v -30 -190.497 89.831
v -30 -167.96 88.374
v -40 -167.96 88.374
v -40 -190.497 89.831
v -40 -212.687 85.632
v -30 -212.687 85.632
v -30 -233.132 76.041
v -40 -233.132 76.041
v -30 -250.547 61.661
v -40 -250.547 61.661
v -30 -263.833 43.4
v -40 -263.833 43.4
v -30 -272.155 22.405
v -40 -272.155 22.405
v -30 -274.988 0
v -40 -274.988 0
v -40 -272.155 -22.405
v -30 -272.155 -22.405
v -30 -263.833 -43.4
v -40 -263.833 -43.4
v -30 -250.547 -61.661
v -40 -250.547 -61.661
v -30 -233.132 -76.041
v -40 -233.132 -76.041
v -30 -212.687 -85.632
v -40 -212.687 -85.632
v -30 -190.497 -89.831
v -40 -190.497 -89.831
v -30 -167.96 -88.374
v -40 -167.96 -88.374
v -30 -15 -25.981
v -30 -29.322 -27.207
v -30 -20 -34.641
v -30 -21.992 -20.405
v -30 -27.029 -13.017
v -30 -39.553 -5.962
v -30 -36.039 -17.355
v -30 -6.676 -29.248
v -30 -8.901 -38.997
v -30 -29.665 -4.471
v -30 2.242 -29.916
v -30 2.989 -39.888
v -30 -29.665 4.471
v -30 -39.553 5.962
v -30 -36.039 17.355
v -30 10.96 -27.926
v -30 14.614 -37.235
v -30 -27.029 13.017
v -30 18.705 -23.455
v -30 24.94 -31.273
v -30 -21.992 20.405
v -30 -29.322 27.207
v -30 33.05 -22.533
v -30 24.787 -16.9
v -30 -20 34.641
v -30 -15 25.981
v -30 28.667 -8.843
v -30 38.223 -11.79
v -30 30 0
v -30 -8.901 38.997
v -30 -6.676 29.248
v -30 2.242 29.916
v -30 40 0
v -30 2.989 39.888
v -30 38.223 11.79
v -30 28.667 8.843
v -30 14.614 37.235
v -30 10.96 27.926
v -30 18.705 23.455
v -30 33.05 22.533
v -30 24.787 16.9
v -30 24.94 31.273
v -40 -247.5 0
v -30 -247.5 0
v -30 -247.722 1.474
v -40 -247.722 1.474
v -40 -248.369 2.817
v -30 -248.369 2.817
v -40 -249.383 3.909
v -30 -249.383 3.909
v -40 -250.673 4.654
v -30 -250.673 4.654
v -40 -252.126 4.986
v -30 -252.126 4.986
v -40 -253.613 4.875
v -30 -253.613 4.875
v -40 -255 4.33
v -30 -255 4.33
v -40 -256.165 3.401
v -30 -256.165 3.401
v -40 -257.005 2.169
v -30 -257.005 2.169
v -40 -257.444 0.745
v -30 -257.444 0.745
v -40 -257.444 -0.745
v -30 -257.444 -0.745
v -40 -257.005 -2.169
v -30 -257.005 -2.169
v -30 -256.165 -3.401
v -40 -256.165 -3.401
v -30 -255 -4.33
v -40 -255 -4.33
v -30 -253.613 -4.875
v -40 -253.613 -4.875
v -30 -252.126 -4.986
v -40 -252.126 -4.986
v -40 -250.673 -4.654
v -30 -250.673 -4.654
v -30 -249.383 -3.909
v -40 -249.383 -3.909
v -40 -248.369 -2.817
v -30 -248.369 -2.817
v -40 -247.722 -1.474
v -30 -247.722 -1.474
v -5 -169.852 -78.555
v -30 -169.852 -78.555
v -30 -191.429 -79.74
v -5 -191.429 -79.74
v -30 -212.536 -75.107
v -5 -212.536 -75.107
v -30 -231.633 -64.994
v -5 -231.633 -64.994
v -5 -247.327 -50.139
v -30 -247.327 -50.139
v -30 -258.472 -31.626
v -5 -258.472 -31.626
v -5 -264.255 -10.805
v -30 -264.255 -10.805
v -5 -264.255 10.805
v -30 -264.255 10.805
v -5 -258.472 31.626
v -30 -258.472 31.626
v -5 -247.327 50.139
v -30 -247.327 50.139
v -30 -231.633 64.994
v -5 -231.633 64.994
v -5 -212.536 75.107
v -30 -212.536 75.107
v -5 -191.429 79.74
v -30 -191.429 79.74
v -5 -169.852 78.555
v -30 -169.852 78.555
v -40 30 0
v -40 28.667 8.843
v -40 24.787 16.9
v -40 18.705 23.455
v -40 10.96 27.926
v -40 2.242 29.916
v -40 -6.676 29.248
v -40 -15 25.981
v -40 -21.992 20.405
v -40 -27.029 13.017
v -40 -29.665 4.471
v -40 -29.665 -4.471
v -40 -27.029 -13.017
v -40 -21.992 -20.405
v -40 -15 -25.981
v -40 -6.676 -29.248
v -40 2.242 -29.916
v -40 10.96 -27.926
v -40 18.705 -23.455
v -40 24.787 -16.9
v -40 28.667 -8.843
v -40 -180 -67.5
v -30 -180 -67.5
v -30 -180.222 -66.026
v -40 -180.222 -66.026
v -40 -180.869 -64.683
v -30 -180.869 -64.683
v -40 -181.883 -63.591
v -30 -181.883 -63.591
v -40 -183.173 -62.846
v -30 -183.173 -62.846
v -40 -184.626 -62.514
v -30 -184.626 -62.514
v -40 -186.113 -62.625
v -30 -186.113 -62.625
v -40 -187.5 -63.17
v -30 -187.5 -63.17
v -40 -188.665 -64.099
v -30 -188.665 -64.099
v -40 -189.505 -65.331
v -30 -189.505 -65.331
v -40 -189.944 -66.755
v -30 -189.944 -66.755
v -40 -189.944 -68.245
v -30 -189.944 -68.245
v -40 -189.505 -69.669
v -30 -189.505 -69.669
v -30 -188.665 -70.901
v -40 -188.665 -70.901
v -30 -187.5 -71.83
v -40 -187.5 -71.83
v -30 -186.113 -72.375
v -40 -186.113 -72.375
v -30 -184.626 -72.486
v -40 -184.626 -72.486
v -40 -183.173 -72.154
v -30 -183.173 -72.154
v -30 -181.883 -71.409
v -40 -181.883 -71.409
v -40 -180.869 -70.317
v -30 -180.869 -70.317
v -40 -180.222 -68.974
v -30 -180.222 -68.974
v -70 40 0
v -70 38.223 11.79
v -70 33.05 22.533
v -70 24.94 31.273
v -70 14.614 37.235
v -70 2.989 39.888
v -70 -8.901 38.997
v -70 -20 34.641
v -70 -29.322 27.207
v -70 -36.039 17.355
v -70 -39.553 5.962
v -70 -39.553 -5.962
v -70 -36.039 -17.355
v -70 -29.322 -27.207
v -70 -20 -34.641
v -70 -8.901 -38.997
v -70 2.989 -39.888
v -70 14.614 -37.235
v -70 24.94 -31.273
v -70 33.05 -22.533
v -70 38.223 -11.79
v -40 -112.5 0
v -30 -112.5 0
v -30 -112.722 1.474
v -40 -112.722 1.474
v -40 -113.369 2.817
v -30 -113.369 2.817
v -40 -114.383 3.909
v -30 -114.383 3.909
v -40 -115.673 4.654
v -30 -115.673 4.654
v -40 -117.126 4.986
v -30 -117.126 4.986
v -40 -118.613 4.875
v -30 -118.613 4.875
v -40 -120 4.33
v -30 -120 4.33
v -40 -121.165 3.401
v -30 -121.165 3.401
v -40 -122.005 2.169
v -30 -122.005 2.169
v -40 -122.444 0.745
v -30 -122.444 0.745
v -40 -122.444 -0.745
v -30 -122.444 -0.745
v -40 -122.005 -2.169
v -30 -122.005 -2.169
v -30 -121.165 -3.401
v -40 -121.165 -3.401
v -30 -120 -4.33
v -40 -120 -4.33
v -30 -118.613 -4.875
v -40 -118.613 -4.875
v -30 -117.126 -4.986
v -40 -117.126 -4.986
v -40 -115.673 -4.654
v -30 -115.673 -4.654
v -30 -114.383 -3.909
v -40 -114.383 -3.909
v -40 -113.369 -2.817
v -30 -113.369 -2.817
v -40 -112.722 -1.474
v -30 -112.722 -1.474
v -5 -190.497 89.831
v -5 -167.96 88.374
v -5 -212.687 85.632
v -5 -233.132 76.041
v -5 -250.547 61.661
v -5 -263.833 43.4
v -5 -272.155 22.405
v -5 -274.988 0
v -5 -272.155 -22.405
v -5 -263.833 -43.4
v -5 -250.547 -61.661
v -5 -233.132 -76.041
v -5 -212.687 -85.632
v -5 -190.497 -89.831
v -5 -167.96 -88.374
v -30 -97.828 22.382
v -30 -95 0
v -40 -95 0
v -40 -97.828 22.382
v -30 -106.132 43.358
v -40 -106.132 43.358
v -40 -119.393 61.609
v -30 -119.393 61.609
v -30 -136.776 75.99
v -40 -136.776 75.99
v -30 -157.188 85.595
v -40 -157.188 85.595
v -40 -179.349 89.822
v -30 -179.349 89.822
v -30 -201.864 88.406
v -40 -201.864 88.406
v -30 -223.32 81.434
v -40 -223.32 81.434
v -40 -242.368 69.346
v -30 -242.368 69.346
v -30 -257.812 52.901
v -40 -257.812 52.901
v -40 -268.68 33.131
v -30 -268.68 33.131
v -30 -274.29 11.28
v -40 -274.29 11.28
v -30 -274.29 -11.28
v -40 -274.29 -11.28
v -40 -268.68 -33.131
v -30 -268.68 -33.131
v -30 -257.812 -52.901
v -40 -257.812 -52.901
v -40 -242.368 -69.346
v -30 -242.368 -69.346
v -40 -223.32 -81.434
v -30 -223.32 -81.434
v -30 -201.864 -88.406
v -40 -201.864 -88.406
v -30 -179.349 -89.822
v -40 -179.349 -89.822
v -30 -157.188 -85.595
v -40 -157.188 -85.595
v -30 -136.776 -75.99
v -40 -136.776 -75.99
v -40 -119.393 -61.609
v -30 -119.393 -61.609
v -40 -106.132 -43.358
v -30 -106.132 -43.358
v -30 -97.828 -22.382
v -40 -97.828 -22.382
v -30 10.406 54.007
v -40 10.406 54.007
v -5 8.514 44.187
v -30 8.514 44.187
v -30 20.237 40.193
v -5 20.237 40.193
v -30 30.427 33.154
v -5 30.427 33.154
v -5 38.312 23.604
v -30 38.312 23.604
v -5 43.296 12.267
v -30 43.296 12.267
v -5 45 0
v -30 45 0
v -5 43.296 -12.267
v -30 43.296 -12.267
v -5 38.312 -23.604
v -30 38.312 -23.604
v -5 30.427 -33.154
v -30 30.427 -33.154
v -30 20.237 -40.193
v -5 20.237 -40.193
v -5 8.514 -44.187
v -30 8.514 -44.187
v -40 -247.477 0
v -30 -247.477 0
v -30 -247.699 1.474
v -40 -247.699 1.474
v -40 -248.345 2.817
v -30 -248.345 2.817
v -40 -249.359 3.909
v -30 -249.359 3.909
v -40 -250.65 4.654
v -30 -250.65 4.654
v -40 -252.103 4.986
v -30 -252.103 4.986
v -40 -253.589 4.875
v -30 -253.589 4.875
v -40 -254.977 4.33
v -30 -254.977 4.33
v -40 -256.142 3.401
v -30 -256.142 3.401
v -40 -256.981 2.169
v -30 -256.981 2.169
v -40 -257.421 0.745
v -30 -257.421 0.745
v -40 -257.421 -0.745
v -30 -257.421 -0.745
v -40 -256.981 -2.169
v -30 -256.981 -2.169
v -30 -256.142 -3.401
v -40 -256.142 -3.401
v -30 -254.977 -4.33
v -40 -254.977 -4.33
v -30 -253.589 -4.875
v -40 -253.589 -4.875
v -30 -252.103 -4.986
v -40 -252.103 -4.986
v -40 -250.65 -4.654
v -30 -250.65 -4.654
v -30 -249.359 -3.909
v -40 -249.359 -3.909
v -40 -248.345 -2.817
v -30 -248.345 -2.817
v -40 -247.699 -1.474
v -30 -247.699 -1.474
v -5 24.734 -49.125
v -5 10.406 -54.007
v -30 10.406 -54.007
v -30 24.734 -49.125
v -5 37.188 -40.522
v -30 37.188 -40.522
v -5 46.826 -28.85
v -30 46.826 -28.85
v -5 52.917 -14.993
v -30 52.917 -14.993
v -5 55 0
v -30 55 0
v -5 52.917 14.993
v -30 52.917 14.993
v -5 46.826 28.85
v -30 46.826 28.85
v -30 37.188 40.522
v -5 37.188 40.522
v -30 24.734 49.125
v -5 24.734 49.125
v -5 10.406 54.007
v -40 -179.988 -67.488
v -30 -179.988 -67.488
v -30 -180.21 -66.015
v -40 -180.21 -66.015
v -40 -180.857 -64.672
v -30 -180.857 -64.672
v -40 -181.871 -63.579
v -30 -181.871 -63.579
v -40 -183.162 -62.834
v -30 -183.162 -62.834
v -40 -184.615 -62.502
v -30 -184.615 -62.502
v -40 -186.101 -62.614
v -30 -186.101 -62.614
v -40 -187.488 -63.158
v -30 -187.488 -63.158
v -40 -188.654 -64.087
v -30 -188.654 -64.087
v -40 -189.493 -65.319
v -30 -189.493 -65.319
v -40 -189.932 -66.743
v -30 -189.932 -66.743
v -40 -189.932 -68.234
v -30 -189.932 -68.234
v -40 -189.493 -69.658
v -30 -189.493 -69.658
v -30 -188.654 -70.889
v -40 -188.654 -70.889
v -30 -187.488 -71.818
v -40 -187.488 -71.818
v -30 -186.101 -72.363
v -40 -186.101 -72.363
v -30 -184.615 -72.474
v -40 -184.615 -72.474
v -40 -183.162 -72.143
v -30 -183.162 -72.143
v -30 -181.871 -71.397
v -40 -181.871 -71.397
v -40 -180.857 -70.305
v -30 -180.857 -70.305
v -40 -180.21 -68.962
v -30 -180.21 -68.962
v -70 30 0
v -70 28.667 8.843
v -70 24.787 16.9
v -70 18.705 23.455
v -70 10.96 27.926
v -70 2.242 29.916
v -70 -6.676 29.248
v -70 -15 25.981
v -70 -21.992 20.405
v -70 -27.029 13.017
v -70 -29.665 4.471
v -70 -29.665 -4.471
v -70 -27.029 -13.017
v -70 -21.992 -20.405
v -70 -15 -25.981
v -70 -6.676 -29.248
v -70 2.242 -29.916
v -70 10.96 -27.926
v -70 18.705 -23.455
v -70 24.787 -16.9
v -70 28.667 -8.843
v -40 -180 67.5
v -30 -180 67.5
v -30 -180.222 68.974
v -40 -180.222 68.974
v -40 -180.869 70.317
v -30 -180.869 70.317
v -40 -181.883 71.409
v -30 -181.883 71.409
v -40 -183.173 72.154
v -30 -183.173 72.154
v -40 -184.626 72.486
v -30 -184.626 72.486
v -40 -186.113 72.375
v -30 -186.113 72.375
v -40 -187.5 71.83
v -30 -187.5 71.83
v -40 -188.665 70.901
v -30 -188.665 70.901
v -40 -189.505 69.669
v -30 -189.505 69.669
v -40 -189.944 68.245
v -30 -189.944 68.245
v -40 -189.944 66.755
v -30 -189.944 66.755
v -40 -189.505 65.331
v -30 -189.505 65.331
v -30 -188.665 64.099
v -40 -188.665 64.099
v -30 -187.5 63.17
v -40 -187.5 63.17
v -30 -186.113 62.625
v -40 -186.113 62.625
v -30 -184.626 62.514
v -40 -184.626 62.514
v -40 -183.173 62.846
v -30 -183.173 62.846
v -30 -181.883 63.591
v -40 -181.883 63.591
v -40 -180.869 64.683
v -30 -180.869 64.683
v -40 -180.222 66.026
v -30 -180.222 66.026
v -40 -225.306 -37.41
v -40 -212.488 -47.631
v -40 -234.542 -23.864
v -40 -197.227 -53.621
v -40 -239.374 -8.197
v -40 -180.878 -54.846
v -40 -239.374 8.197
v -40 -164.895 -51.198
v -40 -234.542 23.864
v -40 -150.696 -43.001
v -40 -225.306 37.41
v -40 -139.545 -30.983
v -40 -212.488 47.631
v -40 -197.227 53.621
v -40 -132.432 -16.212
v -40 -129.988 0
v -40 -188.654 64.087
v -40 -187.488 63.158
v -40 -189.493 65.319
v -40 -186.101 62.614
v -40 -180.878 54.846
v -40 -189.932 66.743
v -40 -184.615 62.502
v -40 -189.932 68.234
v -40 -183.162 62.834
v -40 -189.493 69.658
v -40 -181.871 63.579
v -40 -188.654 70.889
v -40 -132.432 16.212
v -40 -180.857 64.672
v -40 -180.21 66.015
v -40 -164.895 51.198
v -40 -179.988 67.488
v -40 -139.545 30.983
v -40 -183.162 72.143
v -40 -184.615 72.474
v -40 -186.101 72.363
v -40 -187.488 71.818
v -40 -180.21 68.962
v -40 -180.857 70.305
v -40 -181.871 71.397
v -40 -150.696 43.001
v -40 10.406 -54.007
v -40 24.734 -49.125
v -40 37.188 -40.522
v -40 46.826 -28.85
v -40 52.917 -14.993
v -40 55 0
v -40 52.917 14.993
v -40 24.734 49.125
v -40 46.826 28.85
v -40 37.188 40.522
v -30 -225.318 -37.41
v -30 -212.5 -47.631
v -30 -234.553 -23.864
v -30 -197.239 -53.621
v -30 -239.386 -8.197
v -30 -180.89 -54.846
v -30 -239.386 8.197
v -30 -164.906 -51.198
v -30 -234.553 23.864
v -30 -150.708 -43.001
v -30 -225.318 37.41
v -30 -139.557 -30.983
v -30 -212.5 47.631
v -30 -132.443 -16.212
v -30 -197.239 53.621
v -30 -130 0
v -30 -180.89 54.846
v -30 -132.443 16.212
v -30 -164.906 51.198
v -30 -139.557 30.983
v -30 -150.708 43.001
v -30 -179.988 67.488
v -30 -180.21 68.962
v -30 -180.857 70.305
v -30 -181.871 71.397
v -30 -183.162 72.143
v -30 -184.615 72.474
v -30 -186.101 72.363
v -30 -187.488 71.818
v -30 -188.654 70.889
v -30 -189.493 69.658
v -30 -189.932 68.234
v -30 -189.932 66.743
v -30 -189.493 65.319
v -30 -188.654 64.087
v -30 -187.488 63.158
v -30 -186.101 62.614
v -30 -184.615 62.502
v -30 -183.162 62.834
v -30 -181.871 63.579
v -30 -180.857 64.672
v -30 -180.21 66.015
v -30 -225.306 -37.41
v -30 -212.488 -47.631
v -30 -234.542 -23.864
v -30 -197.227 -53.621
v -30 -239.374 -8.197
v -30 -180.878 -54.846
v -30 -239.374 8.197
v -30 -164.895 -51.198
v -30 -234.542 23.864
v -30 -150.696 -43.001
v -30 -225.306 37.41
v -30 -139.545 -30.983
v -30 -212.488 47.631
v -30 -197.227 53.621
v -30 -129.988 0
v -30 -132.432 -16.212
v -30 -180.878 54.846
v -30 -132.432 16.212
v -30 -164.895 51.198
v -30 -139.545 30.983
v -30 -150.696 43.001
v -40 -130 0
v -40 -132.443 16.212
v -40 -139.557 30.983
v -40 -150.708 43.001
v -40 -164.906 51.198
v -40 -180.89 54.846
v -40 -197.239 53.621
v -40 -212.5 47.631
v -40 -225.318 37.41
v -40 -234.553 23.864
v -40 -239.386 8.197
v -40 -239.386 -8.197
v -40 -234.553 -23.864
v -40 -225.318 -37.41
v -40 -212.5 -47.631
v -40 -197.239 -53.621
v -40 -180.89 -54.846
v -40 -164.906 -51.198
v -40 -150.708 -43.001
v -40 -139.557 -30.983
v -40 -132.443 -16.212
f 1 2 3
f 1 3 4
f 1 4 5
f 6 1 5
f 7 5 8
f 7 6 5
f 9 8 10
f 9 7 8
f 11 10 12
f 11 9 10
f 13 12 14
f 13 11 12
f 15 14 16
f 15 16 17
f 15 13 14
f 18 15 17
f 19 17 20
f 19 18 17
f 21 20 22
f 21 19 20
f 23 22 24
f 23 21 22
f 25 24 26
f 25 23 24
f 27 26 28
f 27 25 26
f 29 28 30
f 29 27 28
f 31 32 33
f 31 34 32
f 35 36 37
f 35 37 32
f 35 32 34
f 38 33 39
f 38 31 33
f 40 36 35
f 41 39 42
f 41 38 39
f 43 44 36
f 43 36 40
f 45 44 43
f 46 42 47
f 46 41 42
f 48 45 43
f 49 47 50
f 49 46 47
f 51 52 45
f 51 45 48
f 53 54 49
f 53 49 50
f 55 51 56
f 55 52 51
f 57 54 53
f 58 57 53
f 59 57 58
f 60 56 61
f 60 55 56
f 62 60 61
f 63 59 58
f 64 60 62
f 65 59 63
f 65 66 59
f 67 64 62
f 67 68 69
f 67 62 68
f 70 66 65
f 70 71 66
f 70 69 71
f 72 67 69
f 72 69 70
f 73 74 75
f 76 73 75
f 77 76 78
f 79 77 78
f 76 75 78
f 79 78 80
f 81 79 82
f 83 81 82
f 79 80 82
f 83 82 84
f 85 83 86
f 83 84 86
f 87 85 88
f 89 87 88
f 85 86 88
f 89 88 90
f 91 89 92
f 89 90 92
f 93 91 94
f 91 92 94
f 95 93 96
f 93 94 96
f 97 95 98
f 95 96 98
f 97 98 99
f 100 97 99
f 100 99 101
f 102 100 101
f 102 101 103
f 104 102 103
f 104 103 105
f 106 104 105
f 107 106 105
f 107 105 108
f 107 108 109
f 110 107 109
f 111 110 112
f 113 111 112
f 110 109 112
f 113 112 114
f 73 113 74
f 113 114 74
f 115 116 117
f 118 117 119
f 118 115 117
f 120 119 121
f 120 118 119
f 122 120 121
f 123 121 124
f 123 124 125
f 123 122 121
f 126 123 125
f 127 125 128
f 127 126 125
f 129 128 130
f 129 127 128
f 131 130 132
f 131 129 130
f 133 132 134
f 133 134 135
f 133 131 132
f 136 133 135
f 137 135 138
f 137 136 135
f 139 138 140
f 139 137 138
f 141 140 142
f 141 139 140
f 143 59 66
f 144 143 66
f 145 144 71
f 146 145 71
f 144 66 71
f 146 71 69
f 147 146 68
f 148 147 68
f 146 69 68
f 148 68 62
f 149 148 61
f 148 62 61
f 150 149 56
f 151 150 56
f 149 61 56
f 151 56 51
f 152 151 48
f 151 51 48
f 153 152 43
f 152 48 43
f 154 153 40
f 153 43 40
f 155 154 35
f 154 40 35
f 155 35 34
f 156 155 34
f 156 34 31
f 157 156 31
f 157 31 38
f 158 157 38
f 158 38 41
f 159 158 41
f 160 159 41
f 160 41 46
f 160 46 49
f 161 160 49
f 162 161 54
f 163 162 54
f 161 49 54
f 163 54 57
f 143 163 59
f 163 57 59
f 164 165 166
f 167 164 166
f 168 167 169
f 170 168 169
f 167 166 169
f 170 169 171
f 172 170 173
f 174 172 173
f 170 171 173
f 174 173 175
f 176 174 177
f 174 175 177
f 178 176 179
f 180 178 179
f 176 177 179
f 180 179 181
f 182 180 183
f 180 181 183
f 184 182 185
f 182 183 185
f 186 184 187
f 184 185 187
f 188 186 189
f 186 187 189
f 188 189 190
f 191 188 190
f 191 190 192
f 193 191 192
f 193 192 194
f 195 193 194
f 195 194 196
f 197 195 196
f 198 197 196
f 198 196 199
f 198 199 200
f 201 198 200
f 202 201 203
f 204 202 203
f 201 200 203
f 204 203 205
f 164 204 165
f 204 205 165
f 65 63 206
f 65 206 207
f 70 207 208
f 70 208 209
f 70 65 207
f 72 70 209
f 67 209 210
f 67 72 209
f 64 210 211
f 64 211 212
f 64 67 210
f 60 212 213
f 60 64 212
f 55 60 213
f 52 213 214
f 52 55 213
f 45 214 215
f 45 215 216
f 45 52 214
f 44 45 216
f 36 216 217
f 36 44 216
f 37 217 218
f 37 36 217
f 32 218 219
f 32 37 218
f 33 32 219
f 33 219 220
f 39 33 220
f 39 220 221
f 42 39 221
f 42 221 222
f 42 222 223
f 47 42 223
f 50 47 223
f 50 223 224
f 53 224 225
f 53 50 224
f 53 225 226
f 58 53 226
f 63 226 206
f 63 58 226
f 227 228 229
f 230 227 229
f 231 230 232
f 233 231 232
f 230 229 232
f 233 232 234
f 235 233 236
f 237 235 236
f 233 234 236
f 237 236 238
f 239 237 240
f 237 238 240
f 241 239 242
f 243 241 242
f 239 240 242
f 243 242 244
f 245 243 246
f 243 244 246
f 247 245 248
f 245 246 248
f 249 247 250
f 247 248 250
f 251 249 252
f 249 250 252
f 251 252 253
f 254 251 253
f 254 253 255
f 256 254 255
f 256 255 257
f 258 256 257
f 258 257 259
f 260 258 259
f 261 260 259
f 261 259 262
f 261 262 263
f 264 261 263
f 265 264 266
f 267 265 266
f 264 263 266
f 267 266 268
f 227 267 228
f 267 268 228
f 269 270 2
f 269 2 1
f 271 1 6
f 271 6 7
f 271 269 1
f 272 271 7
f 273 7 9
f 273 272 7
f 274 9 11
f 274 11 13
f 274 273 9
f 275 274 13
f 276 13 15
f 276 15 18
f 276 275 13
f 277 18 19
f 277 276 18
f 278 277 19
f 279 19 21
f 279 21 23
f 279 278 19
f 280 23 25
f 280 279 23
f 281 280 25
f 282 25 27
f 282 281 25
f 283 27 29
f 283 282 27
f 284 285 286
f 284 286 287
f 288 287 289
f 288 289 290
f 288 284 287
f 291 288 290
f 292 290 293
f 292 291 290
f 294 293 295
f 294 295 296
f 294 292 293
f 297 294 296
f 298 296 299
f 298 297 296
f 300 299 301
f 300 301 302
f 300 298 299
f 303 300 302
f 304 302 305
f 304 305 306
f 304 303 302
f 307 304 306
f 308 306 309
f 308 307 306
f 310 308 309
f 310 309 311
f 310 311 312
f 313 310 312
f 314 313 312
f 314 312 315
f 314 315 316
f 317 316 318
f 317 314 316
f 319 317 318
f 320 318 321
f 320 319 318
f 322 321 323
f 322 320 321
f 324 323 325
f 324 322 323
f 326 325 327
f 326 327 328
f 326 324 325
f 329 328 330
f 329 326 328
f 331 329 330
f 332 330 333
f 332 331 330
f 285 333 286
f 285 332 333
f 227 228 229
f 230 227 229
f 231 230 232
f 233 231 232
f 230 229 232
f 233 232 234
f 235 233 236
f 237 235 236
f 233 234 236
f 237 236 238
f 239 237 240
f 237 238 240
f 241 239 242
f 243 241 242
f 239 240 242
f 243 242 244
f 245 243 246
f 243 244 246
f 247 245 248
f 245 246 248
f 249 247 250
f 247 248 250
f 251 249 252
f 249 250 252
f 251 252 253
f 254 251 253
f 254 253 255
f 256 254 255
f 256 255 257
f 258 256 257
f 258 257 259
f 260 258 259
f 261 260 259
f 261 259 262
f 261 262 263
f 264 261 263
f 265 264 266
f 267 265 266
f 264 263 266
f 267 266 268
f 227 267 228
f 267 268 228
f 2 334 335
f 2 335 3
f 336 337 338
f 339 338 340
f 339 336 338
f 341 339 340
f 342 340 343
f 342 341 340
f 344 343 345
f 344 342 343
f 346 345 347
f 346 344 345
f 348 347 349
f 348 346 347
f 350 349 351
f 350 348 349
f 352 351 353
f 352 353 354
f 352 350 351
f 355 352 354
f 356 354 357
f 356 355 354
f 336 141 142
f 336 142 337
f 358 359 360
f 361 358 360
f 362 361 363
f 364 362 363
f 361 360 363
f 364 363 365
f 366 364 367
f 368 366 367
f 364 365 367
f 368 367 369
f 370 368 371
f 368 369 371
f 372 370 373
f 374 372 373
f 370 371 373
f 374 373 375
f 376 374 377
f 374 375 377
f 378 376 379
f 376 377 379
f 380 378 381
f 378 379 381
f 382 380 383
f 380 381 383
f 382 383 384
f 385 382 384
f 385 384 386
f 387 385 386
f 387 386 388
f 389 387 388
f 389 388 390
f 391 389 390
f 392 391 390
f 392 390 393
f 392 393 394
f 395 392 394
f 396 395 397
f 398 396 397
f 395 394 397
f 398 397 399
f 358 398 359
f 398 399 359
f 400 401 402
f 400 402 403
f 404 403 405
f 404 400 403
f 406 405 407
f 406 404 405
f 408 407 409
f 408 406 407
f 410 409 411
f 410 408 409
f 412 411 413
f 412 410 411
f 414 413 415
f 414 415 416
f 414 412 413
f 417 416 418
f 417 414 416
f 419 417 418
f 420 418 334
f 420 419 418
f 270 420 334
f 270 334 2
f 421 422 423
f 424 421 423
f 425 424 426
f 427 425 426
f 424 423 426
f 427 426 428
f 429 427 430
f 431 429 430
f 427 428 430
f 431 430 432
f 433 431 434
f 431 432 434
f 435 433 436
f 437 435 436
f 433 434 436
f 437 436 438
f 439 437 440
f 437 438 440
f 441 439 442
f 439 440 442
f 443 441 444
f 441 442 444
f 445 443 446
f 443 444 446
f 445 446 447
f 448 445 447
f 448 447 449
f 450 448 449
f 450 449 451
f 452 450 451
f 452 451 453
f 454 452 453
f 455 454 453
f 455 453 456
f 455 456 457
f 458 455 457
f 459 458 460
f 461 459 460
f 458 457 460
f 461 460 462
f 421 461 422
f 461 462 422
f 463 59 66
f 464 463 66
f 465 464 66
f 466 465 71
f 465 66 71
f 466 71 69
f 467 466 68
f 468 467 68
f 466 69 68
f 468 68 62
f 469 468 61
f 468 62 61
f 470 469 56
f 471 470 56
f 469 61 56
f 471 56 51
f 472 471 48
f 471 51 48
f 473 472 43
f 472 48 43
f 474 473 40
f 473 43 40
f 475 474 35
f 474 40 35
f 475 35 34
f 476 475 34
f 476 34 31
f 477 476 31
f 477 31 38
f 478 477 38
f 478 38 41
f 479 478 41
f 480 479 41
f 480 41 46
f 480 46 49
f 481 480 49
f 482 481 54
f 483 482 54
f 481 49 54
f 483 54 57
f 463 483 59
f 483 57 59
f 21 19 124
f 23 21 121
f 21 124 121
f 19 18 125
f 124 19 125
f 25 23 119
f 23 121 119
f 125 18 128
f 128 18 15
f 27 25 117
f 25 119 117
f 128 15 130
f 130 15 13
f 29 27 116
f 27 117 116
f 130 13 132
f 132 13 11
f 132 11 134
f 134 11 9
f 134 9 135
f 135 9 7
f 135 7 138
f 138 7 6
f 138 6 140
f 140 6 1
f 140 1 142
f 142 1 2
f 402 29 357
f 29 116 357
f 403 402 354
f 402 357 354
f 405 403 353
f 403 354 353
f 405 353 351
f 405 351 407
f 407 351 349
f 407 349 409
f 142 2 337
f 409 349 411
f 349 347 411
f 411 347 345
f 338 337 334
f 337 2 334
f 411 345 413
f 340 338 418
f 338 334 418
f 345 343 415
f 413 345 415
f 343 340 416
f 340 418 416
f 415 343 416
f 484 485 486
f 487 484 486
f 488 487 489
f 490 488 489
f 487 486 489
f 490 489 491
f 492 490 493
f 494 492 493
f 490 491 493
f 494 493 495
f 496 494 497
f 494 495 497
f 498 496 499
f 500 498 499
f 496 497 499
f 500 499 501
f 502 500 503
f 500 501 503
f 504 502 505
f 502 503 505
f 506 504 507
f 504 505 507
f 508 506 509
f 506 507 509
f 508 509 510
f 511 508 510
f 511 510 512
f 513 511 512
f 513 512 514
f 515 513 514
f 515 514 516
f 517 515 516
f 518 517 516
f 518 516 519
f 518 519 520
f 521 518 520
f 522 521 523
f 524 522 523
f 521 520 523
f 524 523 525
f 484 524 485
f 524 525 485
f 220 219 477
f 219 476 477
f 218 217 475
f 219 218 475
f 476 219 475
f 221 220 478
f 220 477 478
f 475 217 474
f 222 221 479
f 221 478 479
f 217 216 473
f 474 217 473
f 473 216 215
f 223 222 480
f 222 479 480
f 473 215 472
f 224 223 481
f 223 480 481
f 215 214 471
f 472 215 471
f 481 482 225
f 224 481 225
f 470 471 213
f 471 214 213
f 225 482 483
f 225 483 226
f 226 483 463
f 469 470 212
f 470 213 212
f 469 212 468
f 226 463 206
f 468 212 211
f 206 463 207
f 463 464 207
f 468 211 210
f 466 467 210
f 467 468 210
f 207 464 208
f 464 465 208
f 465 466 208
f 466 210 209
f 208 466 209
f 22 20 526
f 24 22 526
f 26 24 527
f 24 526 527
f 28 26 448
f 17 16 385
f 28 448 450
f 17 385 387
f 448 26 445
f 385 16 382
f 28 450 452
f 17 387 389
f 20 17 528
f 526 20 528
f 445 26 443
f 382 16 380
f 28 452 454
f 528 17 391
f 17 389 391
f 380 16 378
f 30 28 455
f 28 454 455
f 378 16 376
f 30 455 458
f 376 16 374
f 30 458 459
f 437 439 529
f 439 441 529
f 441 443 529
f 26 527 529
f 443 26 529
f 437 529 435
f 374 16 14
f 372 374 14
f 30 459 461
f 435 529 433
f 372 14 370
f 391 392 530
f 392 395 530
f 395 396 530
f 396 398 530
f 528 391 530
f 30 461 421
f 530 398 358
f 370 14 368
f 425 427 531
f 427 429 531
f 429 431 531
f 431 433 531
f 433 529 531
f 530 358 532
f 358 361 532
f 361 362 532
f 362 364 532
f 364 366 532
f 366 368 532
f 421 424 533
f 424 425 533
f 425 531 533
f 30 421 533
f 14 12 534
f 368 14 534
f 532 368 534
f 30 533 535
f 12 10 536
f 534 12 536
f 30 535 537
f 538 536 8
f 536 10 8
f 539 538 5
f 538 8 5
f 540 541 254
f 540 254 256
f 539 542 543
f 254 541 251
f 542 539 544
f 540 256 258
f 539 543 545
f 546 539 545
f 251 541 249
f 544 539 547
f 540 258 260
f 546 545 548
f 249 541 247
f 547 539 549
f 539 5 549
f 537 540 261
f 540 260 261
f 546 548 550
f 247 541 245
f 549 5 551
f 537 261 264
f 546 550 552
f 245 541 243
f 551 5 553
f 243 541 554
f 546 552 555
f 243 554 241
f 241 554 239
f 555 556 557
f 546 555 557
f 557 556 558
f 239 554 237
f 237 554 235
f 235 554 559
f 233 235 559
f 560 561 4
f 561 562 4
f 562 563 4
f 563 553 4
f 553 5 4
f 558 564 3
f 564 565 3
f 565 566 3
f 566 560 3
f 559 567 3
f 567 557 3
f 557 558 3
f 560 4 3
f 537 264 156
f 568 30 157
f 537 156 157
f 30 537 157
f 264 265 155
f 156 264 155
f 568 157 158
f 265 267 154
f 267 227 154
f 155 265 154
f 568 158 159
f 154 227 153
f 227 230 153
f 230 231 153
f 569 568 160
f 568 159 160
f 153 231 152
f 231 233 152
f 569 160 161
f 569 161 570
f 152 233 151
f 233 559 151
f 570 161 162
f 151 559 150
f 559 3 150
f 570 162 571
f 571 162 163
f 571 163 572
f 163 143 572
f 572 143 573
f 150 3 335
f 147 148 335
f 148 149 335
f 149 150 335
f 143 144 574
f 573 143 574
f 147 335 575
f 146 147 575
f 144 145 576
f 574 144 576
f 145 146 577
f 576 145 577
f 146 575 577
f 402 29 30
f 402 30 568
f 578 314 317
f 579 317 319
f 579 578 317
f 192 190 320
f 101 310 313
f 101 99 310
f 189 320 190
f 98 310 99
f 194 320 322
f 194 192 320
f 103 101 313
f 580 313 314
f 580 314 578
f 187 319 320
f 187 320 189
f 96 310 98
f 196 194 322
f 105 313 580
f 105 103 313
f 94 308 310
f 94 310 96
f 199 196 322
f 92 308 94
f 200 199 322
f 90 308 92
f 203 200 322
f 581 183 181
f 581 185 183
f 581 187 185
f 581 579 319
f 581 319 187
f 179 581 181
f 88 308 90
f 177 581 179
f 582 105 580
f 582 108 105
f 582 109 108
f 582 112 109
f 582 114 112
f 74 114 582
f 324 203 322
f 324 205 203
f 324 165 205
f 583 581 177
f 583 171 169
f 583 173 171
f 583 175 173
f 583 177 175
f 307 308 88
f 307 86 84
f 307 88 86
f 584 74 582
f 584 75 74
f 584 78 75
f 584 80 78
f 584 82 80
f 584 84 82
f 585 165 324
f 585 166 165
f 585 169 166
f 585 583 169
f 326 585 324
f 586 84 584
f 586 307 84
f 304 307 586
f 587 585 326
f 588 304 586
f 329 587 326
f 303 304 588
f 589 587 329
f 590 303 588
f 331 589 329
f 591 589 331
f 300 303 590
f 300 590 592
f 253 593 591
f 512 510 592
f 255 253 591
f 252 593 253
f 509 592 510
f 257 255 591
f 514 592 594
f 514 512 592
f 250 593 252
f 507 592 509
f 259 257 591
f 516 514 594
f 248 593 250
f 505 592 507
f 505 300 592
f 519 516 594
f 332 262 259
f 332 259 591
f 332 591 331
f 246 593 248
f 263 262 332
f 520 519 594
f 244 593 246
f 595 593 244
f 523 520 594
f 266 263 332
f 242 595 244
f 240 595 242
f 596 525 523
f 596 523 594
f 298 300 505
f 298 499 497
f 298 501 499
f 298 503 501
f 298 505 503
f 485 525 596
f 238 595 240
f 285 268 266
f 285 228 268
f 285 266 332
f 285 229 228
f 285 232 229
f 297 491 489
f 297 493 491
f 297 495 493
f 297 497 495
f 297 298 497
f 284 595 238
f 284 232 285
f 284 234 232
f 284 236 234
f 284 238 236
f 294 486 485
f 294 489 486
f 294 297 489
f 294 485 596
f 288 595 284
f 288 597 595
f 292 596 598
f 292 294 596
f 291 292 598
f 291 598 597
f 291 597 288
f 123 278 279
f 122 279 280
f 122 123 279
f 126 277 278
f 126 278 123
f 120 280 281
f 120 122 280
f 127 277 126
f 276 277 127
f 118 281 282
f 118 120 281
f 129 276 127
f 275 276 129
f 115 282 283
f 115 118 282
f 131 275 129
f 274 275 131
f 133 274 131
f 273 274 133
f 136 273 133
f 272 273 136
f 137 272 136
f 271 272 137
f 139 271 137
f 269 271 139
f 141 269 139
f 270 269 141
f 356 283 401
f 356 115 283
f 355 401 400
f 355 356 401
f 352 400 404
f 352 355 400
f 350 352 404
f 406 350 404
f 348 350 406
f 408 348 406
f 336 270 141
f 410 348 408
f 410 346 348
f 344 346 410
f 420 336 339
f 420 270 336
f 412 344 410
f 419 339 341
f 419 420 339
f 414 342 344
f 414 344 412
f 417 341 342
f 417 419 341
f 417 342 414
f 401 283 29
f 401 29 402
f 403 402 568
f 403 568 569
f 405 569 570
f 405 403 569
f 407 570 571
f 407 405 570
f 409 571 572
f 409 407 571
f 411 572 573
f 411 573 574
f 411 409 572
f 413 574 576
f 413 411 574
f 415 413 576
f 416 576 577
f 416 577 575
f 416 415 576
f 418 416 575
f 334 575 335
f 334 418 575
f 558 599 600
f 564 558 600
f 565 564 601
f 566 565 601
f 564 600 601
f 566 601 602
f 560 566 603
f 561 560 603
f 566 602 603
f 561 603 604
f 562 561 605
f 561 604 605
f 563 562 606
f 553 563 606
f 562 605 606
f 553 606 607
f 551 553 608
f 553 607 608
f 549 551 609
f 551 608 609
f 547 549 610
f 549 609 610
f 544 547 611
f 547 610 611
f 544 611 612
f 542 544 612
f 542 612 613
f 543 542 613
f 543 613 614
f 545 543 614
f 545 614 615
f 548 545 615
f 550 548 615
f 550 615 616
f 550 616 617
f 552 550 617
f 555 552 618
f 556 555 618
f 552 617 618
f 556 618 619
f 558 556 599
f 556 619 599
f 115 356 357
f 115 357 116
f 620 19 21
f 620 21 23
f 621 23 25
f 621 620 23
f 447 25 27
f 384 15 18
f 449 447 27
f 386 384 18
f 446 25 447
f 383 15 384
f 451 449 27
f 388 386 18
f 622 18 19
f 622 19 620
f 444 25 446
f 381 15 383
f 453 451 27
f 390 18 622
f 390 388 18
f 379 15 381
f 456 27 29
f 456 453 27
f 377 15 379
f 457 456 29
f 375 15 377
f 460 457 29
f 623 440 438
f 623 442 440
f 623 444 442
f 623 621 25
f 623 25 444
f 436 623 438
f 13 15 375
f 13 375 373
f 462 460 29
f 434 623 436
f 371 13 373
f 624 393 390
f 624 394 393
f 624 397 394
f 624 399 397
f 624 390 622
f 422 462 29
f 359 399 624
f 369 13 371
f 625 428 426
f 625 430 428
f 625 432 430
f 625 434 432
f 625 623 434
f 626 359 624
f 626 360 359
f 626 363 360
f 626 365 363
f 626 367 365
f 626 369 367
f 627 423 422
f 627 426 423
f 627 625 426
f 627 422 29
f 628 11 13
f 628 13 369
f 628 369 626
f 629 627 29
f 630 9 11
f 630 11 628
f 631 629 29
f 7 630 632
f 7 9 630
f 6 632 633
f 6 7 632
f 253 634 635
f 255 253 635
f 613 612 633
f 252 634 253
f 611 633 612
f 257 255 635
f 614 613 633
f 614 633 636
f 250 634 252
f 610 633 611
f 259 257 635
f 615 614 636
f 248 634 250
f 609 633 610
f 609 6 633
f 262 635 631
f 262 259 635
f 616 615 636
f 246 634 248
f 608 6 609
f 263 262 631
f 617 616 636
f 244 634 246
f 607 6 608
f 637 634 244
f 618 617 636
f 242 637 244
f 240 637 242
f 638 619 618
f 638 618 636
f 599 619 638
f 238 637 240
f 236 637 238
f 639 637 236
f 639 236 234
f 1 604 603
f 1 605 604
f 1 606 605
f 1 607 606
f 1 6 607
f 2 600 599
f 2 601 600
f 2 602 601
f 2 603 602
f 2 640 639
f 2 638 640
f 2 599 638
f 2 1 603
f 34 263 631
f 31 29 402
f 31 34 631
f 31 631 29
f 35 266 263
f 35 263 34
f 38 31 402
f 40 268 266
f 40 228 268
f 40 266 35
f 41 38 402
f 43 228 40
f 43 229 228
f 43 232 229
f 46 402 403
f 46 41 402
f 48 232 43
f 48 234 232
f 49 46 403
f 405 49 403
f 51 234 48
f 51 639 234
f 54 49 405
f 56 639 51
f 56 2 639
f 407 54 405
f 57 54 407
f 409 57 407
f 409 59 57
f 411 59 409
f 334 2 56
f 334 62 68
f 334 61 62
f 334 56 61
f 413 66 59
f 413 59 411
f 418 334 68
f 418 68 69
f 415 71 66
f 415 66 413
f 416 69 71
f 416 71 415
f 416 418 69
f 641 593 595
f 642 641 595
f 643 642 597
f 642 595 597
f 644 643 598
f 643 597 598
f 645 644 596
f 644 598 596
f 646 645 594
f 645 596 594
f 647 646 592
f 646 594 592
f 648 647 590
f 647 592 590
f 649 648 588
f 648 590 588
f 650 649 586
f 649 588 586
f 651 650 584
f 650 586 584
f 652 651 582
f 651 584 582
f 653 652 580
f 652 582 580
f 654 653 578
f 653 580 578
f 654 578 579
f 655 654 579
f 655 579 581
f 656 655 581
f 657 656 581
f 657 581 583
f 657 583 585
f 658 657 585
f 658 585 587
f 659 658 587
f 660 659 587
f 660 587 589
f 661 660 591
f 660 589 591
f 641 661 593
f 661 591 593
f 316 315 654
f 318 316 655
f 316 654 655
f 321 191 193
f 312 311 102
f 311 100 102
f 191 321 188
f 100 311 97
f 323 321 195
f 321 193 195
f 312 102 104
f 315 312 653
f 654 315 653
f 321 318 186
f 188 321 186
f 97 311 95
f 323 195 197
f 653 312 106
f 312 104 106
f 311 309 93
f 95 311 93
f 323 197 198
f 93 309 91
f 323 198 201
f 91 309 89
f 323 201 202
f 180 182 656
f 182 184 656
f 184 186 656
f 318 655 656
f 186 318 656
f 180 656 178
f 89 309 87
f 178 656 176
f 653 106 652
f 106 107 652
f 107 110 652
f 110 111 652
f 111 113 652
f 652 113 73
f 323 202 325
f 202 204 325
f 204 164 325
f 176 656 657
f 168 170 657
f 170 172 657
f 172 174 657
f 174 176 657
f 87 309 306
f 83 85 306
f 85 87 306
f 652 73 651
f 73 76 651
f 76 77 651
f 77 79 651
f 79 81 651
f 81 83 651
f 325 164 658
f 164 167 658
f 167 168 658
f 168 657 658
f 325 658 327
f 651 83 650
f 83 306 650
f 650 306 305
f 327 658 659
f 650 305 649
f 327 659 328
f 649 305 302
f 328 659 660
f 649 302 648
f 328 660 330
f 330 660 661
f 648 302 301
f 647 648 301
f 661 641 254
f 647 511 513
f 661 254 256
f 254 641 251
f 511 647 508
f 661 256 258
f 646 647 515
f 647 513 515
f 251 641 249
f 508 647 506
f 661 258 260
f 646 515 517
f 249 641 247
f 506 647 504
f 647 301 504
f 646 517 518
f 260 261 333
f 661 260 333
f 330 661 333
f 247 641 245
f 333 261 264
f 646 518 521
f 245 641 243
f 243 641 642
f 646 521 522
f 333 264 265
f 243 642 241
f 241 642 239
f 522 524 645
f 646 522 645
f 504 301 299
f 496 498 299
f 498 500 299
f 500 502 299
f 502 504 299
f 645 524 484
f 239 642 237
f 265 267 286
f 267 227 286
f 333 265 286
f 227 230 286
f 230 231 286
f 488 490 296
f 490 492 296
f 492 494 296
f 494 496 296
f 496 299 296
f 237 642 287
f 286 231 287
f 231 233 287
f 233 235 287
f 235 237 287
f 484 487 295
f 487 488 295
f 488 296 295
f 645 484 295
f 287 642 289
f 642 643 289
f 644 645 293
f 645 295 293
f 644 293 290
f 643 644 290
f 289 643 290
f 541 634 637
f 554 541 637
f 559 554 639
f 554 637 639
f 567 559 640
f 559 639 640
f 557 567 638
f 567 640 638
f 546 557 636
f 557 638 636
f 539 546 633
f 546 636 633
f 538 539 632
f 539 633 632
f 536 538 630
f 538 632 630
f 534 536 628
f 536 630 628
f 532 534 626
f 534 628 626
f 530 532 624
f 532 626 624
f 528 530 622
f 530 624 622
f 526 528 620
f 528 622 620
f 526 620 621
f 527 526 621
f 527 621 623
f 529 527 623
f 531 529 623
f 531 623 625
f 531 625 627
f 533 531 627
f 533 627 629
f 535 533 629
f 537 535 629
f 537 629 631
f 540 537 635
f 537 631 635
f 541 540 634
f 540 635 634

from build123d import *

# Parameters (mm, degrees)
F1_START = -30
F0_R     = 40
F0_R_2   = 30
F1_DEPTH = 40
F2_START = -30
F0_R_3   = 90
F0_R_4   = 5
F0_R_5   = 55
F2_DEPTH = 10
F4_START = -30
F3_R     = 5
F3_R_2   = 55
F3_R_3   = 30
F4_DEPTH = 10
F6_START = -5
F6_DEPTH = 25


with BuildPart() as f1:
    # F0 (on Right) → F1 (new body)
    with BuildSketch(Plane.YZ.offset(F1_START)):
        Circle(F0_R)
        Circle(F0_R_2, mode=Mode.SUBTRACT)
    extrude(amount=-F1_DEPTH)


with BuildPart() as f2:
    # F0 (on Right) → F2 (new body)
    with BuildSketch(Plane.YZ.offset(F2_START)):
        with Locations((-185, 0)):
            Circle(F0_R_3)
        with Locations((-185, -67.5)):
            Circle(F0_R_4, mode=Mode.SUBTRACT)
        with Locations((-252.5, 0)):
            Circle(F0_R_4, mode=Mode.SUBTRACT)
        with Locations((-185, 0)):
            Circle(F0_R_5, mode=Mode.SUBTRACT)
        with Locations((-185, 67.5)):
            Circle(F0_R_4, mode=Mode.SUBTRACT)
        with Locations((-117.5, 0)):
            Circle(F0_R_4, mode=Mode.SUBTRACT)
    extrude(amount=-F2_DEPTH)


with BuildPart() as f4:
    # F3 (on Right) → F4 (new body)
    with BuildSketch(Plane.YZ.offset(F4_START)):
        with BuildLine():
            Line((-167.960185218, -88.3744513143), (10.4060640771, -54.0066091365))
            ThreePointArc((10.4060640771, -54.0066091365), (55, 0), (10.4060640771, 54.0066091365))
            Line((10.4060640771, 54.0066091365), (-167.960185218, 88.3744513143))
            ThreePointArc((-167.960185218, 88.3744513143), (-274.9882900715, 0), (-167.960185218, -88.3744513143))
        make_face()
        with Locations((-184.9882900715, -67.4882900715)):
            Circle(F3_R, mode=Mode.SUBTRACT)
        with Locations((-252.476580143, 0)):
            Circle(F3_R, mode=Mode.SUBTRACT)
        with Locations((-184.9882900715, 0)):
            Circle(F3_R_2, mode=Mode.SUBTRACT)
        with Locations((-117.5, 0)):
            Circle(F3_R, mode=Mode.SUBTRACT)
        with Locations((-184.9882900715, 67.4882900715)):
            Circle(F3_R, mode=Mode.SUBTRACT)
        Circle(F3_R_3, mode=Mode.SUBTRACT)
    extrude(amount=-F4_DEPTH)


with BuildPart() as f6:
    # F5 (on Right) → F6 (new body)
    with BuildSketch(Plane.YZ.offset(F6_START)):
        with BuildLine():
            ThreePointArc((-167.960185218, 88.3744513143), (-274.9882900715, 0), (-167.960185218, -88.3744513143))
            Line((-167.960185218, -88.3744513143), (10.4060640771, -54.0066091365))
            ThreePointArc((10.4060640771, -54.0066091365), (55, 0), (10.4060640771, 54.0066091365))
            Line((10.4060640771, 54.0066091365), (-167.960185218, 88.3744513143))
        make_face()
        with BuildLine():
            Line((8.5140524267, -44.1872256571), (-169.8521968684, -78.5550678349))
            ThreePointArc((-169.8521968684, -78.5550678349), (-264.9882900715, 0), (-169.8521968684, 78.5550678349))
            Line((-169.8521968684, 78.5550678349), (8.5140524267, 44.1872256571))
            ThreePointArc((8.5140524267, 44.1872256571), (45, 0), (8.5140524267, -44.1872256571))
        make_face(mode=Mode.SUBTRACT)
    extrude(amount=-F6_DEPTH)


solid = Compound([f1.part, f2.part, f4.part, f6.part])
